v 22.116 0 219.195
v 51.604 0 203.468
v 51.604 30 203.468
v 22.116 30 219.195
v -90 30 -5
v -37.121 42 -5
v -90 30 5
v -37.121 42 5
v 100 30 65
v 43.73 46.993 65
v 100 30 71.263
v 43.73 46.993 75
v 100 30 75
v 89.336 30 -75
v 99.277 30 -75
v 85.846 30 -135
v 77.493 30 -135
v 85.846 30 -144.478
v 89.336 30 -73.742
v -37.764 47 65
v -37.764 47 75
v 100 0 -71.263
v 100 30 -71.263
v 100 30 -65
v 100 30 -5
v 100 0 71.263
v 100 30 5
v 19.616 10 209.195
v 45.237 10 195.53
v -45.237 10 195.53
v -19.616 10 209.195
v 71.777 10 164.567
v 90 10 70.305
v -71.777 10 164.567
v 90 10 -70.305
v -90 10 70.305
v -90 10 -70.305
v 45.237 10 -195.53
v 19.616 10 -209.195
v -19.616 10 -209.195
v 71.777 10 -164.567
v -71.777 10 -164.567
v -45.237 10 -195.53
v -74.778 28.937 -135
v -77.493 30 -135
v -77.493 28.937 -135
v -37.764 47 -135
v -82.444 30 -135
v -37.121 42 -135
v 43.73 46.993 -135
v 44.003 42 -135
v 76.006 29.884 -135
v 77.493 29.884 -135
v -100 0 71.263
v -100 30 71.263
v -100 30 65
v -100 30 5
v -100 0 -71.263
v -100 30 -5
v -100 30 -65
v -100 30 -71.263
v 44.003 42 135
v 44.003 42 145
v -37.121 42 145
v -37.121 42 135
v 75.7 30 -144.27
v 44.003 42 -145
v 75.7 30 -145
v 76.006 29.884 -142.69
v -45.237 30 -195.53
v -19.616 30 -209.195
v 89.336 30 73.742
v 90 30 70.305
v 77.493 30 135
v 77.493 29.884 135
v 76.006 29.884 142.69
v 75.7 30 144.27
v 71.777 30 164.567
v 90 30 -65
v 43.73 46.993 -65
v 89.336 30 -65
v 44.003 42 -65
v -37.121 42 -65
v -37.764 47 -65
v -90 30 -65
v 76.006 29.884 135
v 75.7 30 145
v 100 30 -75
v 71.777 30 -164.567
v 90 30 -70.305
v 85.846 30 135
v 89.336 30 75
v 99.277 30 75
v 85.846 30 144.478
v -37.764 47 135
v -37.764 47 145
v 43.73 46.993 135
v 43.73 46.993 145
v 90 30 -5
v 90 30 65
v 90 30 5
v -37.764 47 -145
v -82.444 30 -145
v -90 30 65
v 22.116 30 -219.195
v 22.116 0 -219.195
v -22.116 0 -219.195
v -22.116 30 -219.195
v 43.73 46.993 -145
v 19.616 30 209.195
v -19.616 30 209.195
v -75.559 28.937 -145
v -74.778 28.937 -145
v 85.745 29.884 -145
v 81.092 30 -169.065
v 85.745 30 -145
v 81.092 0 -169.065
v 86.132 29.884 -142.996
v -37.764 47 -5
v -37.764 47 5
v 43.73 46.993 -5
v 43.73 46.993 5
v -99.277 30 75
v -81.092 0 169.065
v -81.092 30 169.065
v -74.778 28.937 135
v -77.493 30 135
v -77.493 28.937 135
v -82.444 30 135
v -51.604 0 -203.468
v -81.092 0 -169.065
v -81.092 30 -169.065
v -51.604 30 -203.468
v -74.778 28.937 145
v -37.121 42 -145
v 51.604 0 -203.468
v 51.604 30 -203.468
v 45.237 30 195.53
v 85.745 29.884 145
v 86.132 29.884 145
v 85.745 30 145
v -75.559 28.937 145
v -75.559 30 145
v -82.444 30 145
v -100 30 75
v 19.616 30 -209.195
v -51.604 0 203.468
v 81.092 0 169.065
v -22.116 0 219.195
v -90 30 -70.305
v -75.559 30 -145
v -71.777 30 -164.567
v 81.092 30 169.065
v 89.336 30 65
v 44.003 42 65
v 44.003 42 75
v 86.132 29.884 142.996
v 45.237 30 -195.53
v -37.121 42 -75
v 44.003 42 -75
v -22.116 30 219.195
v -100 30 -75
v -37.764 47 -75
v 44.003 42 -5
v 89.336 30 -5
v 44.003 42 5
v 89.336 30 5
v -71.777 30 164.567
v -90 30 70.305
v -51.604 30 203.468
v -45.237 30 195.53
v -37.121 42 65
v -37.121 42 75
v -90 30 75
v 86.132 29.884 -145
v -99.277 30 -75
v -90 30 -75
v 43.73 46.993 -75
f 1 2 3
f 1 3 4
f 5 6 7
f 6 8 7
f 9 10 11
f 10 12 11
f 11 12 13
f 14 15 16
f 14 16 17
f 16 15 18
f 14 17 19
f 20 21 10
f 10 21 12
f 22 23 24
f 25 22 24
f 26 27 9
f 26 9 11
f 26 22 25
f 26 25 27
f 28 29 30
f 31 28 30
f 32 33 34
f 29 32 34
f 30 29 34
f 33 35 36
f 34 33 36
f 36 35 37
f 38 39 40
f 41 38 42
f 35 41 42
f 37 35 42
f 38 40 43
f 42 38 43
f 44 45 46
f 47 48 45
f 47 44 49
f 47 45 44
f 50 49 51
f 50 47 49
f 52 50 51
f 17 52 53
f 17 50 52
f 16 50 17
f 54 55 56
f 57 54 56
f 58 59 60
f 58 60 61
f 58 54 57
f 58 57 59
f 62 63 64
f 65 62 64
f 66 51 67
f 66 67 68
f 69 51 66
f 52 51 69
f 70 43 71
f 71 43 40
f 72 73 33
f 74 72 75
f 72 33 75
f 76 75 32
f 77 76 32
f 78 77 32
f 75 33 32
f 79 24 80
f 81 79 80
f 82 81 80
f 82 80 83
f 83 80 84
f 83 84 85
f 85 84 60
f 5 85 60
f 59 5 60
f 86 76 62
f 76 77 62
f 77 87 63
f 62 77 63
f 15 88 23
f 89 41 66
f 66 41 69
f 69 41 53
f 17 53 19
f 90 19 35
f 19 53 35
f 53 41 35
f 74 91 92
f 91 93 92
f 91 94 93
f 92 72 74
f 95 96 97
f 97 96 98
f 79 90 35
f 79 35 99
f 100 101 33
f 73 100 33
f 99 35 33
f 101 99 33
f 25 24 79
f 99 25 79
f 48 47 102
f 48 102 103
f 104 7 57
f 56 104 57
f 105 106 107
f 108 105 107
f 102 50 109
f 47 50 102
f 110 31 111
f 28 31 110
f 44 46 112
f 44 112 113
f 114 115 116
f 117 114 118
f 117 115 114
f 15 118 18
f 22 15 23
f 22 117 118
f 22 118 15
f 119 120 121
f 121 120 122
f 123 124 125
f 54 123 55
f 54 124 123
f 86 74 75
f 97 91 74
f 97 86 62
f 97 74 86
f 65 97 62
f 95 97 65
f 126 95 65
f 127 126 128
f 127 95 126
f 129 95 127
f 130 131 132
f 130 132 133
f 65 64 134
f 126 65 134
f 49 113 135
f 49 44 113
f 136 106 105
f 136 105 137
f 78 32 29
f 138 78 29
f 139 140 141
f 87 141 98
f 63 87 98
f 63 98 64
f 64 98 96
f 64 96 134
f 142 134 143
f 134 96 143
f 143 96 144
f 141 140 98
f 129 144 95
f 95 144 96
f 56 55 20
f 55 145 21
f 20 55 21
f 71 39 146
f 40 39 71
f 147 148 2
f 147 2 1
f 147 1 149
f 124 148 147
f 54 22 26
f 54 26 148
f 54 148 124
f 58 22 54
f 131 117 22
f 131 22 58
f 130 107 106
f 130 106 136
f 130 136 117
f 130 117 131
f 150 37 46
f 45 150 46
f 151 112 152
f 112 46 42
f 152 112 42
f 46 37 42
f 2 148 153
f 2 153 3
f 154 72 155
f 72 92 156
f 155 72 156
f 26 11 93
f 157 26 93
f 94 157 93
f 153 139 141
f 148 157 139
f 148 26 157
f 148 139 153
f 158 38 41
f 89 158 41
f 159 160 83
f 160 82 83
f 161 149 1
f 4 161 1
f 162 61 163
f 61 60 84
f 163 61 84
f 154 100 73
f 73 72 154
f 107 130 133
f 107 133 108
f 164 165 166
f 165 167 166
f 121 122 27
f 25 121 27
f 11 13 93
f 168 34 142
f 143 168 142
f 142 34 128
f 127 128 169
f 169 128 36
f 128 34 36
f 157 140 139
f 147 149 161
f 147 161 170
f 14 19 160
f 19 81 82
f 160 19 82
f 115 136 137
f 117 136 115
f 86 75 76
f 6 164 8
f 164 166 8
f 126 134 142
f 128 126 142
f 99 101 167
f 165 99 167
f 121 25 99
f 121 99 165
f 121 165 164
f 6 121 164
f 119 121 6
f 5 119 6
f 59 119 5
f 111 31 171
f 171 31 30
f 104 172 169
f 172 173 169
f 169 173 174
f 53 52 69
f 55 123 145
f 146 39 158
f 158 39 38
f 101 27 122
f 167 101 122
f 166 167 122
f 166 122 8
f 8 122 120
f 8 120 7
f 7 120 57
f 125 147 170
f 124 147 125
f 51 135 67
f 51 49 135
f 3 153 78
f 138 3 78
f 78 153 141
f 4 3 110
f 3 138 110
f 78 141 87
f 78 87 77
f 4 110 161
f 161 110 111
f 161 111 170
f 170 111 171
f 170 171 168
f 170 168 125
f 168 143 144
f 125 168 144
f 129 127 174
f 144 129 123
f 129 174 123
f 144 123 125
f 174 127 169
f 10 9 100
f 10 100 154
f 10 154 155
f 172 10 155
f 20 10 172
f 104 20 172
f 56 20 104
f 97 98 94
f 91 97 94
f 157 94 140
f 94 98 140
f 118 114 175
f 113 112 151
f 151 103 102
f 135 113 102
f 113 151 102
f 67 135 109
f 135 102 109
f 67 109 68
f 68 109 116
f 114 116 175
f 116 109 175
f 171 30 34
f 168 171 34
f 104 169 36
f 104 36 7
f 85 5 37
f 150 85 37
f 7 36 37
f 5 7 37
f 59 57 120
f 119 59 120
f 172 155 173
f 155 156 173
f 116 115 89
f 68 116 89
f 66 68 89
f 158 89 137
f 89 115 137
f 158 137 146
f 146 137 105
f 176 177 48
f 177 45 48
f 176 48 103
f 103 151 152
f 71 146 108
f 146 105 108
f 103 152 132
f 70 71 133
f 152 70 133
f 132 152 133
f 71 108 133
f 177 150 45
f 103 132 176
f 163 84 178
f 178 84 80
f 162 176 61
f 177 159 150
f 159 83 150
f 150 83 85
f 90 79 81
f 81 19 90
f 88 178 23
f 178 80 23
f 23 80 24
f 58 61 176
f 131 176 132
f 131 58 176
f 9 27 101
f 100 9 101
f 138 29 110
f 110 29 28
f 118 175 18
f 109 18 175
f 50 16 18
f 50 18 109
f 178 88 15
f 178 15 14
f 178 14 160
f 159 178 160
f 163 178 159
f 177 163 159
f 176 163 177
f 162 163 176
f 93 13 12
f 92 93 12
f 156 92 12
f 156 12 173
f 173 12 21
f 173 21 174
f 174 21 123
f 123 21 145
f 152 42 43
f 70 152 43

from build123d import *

# Parameters (mm, degrees)
BOSS_EXTRUDE1_DEPTH      = 30
SHELL1_T                 = -10
BOSS_EXTRUDE2_DEPTH      = 5
BOSS_EXTRUDE2_DEPTH_BACK = 5
BOSS_EXTRUDE3_DEPTH      = 5
BOSS_EXTRUDE3_DEPTH_BACK = 5
BOSS_EXTRUDE4_DEPTH      = 5
BOSS_EXTRUDE4_DEPTH_BACK = 5
BOSS_EXTRUDE5_DEPTH      = 5
BOSS_EXTRUDE5_DEPTH_BACK = 5
BOSS_EXTRUDE6_DEPTH      = 5
BOSS_EXTRUDE6_DEPTH_BACK = 5


with BuildPart() as part:
    # Sketch1 → Boss-Extrude1 (new body)
    with BuildSketch(Plane(origin=(0, 0, 0), x_dir=(1, 0, 0), z_dir=(0, 1, 0))):
        Polygon((-100, -71.262798635), (-100, 71.262798635), (-81.092150171, 169.064846416), (-51.604095563, 203.467576792), (-22.116040956, 219.194539249), (-2.218430034, 219.194539249), (2.218430034, 219.194539249), (22.116040956, 219.194539249), (51.604095563, 203.467576792), (81.092150171, 169.064846416), (100, 71.262798635), (100, -71.262798635), (81.092150171, -169.064846416), (51.604095563, -203.467576792), (22.116040956, -219.194539249), (2.218430034, -219.194539249), (-2.218430034, -219.194539249), (-22.116040956, -219.194539249), (-51.604095563, -203.467576792), (-81.092150171, -169.064846416), align=None)
    extrude(amount=BOSS_EXTRUDE1_DEPTH)

    # Shell1
    shell1_openings = [part.faces().sort_by_distance(p)[0] for p in [
        (0, 30, 0),
    ]]
    offset(amount=SHELL1_T, openings=shell1_openings, kind=Kind.INTERSECTION)

    # Sketch8 → Boss-Extrude2 (add, two sides)
    with BuildSketch(Plane.XY.offset(140)) as boss_extrude2_sk:
        Polygon((-85.23886946, 28.936642873), (-37.764332208, 47), (43.730401993, 46.992588144), (86.132065283, 29.884377125), (76.005879539, 29.884377125), (44.002548329, 42), (-37.120930368, 42), (-74.777956797, 28.936642873), align=None)
    extrude(amount=BOSS_EXTRUDE2_DEPTH)
    extrude(boss_extrude2_sk.sketch, amount=-BOSS_EXTRUDE2_DEPTH_BACK)

    # Sketch4 → Boss-Extrude3 (add, two sides)
    with BuildSketch(Plane.XY.offset(70)) as boss_extrude3_sk:
        Polygon((-100, 30), (-37.764332208, 47), (43.730401993, 46.992588144), (100, 30), (89.335605337, 30), (44.002548329, 42), (-37.120930368, 42), (-90, 30), align=None)
    extrude(amount=BOSS_EXTRUDE3_DEPTH)
    extrude(boss_extrude3_sk.sketch, amount=-BOSS_EXTRUDE3_DEPTH_BACK)

    # Sketch5 → Boss-Extrude4 (add, two sides)
    with BuildSketch(Plane.XY.offset(-70)) as boss_extrude4_sk:
        Polygon((-100, 30), (-37.764332208, 47), (43.730401993, 46.992588144), (100, 30), (89.335605337, 30), (44.002548329, 42), (-37.120930368, 42), (-90, 30), align=None)
    extrude(amount=BOSS_EXTRUDE4_DEPTH)
    extrude(boss_extrude4_sk.sketch, amount=-BOSS_EXTRUDE4_DEPTH_BACK)

    # Sketch7 → Boss-Extrude5 (add, two sides)
    with BuildSketch(Plane.XY.offset(-140)) as boss_extrude5_sk:
        Polygon((86.132065283, 29.884377125), (43.730401993, 46.992588144), (-37.764332208, 47), (-85.23886946, 28.936642873), (-74.777956797, 28.936642873), (-37.120930368, 42), (44.002548329, 42), (76.005879539, 29.884377125), align=None)
    extrude(amount=BOSS_EXTRUDE5_DEPTH)
    extrude(boss_extrude5_sk.sketch, amount=-BOSS_EXTRUDE5_DEPTH_BACK)

    # Sketch2 → Boss-Extrude6 (add, two sides)
    with BuildSketch(Plane.XY) as boss_extrude6_sk:
        Polygon((43.730401993, 46.992588144), (100, 30), (89.335605337, 30), (44.002548329, 42), (-37.120930368, 42), (-90, 30), (-100, 30), (-37.764332208, 47), align=None)
    extrude(amount=BOSS_EXTRUDE6_DEPTH)
    extrude(boss_extrude6_sk.sketch, amount=-BOSS_EXTRUDE6_DEPTH_BACK)


solid = part.part
